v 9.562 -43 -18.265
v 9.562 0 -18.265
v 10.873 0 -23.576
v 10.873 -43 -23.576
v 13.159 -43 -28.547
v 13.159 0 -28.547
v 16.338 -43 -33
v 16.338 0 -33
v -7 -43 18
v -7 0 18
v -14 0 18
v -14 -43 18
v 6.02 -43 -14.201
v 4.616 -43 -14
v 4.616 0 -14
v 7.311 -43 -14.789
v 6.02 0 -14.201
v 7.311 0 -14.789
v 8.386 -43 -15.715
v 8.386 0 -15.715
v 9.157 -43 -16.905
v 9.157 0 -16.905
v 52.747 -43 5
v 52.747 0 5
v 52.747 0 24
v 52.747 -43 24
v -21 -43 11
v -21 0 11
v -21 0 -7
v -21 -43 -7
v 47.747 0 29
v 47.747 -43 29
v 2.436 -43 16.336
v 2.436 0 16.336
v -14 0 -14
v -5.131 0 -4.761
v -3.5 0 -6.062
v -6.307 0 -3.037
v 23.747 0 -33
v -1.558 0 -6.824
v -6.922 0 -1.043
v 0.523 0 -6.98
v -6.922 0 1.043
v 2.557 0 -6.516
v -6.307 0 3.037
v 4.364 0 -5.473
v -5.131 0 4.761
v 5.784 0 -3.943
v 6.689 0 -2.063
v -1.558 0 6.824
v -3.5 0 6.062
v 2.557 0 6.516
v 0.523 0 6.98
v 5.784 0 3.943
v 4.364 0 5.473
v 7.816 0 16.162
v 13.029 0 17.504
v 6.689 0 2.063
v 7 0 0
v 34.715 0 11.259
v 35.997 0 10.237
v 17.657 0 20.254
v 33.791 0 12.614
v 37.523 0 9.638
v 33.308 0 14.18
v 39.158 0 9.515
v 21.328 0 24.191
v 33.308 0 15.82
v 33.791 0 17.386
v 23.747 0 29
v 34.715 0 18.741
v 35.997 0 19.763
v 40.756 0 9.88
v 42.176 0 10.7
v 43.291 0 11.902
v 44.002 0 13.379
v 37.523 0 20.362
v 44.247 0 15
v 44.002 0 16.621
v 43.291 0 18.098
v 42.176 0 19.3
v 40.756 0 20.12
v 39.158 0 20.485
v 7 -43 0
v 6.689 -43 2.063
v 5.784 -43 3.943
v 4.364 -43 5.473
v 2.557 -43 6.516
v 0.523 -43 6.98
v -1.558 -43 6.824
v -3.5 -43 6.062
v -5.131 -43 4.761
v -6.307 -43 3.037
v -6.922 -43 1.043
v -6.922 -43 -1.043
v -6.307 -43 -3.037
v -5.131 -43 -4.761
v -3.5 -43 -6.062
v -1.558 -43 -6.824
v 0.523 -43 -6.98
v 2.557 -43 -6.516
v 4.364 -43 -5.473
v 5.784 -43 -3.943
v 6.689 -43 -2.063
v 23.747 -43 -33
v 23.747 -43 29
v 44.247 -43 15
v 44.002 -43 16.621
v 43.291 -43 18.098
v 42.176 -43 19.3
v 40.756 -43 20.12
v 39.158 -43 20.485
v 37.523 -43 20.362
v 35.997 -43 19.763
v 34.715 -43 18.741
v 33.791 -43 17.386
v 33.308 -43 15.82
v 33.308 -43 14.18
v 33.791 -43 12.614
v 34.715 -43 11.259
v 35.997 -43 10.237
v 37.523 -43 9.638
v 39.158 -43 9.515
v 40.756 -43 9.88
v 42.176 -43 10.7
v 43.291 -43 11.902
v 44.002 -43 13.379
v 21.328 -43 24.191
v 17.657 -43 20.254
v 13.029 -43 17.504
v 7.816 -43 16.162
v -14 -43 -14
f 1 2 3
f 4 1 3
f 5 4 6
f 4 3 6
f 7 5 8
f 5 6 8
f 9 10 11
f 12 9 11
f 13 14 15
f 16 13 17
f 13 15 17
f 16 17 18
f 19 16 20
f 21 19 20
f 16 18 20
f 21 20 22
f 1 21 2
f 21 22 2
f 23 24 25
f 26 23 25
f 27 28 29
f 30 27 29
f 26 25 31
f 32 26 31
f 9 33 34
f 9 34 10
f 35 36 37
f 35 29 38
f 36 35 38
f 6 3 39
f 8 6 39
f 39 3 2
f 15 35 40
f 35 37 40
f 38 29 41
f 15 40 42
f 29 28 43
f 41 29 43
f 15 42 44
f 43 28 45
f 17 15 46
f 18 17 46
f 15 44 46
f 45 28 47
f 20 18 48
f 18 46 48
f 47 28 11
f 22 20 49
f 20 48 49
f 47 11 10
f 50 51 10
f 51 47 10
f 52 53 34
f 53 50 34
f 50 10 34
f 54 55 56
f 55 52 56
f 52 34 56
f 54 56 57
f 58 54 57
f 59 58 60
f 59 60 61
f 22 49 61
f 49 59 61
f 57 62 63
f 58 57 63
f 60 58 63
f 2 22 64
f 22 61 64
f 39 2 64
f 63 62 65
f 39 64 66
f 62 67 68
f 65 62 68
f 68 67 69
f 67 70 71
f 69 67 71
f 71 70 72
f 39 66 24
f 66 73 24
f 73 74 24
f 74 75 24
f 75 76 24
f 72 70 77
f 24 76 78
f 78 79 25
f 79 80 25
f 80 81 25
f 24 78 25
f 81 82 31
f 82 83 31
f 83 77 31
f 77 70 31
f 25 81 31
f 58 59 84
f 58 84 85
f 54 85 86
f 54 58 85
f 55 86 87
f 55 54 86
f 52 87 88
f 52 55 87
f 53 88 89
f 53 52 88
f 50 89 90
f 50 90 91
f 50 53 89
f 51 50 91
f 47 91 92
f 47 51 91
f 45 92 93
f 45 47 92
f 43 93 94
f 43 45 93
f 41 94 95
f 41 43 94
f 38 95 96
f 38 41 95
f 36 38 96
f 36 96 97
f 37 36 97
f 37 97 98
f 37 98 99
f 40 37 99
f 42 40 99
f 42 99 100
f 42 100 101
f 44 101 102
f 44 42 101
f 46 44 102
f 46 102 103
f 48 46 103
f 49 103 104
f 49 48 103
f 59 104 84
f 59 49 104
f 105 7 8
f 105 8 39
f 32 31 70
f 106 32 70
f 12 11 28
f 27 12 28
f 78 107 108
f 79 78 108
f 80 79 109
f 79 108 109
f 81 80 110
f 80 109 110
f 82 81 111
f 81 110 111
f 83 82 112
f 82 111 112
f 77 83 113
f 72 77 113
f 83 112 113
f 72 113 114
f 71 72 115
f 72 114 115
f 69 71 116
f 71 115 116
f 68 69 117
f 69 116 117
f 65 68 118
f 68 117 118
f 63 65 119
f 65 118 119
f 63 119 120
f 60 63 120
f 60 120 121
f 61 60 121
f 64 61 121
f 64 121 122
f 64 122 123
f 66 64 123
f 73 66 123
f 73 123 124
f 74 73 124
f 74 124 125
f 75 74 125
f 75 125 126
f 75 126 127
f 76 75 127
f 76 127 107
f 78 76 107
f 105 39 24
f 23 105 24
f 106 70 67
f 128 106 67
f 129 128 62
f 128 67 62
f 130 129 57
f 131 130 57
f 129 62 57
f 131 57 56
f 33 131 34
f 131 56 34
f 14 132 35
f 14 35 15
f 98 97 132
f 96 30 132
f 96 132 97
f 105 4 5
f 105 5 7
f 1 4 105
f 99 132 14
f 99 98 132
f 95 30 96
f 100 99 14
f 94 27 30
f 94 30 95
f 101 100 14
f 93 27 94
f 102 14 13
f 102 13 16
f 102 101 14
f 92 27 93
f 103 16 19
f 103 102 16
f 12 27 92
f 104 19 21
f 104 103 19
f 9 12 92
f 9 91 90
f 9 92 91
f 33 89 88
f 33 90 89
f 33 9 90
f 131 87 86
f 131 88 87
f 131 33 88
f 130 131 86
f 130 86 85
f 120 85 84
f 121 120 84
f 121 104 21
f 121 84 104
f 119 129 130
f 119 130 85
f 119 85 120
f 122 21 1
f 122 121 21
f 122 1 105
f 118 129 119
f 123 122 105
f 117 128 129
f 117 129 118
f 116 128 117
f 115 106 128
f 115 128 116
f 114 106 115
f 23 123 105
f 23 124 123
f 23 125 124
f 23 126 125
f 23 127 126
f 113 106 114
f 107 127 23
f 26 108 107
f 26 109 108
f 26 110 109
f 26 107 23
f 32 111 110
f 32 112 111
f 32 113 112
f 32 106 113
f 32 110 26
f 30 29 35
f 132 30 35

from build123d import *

# Parameters (mm, degrees)
F0_R     = 7
F1_DEPTH = 43
F2_R     = 5.5
F3_DEPTH = 43.001


with BuildPart() as f1:
    # F0 (on Front) → F1 (new body)
    with BuildSketch(Plane.XZ):
        with BuildLine():
            Line((-14, 18), (-21, 11))
            Line((-21, 11), (-21, -7))
            Line((-21, -7), (-14, -14))
            Line((-14, -14), (4.616354, -14))
            ThreePointArc((4.616354, -14), (7.88159, -15.213414), (9.561993, -18.264706))
            ThreePointArc((9.561993, -18.264706), (11.898823, -26.115672), (16.337795, -33))
            Line((16.337795, -33), (23.746698, -33))
            Line((23.746698, -33), (52.746698, 5))
            Line((52.746698, 5), (52.746698, 24))
            Line((52.746698, 24), (47.746698, 29))
            Line((47.746698, 29), (23.746698, 29))
            ThreePointArc((23.746698, 29), (15.440895, 18.713813), (2.43554, 16.33626))
            Line((2.43554, 16.33626), (-7, 18))
            Line((-7, 18), (-14, 18))
        make_face()
        Circle(F0_R, mode=Mode.SUBTRACT)
    extrude(amount=F1_DEPTH)

    # F2 (on face) → F3 (cut, through all)
    with BuildSketch(Plane.XZ.offset(43)):
        with Locations((38.746698, 15)):
            Circle(F2_R)
    extrude(amount=-F3_DEPTH, mode=Mode.SUBTRACT)


solid = f1.part
